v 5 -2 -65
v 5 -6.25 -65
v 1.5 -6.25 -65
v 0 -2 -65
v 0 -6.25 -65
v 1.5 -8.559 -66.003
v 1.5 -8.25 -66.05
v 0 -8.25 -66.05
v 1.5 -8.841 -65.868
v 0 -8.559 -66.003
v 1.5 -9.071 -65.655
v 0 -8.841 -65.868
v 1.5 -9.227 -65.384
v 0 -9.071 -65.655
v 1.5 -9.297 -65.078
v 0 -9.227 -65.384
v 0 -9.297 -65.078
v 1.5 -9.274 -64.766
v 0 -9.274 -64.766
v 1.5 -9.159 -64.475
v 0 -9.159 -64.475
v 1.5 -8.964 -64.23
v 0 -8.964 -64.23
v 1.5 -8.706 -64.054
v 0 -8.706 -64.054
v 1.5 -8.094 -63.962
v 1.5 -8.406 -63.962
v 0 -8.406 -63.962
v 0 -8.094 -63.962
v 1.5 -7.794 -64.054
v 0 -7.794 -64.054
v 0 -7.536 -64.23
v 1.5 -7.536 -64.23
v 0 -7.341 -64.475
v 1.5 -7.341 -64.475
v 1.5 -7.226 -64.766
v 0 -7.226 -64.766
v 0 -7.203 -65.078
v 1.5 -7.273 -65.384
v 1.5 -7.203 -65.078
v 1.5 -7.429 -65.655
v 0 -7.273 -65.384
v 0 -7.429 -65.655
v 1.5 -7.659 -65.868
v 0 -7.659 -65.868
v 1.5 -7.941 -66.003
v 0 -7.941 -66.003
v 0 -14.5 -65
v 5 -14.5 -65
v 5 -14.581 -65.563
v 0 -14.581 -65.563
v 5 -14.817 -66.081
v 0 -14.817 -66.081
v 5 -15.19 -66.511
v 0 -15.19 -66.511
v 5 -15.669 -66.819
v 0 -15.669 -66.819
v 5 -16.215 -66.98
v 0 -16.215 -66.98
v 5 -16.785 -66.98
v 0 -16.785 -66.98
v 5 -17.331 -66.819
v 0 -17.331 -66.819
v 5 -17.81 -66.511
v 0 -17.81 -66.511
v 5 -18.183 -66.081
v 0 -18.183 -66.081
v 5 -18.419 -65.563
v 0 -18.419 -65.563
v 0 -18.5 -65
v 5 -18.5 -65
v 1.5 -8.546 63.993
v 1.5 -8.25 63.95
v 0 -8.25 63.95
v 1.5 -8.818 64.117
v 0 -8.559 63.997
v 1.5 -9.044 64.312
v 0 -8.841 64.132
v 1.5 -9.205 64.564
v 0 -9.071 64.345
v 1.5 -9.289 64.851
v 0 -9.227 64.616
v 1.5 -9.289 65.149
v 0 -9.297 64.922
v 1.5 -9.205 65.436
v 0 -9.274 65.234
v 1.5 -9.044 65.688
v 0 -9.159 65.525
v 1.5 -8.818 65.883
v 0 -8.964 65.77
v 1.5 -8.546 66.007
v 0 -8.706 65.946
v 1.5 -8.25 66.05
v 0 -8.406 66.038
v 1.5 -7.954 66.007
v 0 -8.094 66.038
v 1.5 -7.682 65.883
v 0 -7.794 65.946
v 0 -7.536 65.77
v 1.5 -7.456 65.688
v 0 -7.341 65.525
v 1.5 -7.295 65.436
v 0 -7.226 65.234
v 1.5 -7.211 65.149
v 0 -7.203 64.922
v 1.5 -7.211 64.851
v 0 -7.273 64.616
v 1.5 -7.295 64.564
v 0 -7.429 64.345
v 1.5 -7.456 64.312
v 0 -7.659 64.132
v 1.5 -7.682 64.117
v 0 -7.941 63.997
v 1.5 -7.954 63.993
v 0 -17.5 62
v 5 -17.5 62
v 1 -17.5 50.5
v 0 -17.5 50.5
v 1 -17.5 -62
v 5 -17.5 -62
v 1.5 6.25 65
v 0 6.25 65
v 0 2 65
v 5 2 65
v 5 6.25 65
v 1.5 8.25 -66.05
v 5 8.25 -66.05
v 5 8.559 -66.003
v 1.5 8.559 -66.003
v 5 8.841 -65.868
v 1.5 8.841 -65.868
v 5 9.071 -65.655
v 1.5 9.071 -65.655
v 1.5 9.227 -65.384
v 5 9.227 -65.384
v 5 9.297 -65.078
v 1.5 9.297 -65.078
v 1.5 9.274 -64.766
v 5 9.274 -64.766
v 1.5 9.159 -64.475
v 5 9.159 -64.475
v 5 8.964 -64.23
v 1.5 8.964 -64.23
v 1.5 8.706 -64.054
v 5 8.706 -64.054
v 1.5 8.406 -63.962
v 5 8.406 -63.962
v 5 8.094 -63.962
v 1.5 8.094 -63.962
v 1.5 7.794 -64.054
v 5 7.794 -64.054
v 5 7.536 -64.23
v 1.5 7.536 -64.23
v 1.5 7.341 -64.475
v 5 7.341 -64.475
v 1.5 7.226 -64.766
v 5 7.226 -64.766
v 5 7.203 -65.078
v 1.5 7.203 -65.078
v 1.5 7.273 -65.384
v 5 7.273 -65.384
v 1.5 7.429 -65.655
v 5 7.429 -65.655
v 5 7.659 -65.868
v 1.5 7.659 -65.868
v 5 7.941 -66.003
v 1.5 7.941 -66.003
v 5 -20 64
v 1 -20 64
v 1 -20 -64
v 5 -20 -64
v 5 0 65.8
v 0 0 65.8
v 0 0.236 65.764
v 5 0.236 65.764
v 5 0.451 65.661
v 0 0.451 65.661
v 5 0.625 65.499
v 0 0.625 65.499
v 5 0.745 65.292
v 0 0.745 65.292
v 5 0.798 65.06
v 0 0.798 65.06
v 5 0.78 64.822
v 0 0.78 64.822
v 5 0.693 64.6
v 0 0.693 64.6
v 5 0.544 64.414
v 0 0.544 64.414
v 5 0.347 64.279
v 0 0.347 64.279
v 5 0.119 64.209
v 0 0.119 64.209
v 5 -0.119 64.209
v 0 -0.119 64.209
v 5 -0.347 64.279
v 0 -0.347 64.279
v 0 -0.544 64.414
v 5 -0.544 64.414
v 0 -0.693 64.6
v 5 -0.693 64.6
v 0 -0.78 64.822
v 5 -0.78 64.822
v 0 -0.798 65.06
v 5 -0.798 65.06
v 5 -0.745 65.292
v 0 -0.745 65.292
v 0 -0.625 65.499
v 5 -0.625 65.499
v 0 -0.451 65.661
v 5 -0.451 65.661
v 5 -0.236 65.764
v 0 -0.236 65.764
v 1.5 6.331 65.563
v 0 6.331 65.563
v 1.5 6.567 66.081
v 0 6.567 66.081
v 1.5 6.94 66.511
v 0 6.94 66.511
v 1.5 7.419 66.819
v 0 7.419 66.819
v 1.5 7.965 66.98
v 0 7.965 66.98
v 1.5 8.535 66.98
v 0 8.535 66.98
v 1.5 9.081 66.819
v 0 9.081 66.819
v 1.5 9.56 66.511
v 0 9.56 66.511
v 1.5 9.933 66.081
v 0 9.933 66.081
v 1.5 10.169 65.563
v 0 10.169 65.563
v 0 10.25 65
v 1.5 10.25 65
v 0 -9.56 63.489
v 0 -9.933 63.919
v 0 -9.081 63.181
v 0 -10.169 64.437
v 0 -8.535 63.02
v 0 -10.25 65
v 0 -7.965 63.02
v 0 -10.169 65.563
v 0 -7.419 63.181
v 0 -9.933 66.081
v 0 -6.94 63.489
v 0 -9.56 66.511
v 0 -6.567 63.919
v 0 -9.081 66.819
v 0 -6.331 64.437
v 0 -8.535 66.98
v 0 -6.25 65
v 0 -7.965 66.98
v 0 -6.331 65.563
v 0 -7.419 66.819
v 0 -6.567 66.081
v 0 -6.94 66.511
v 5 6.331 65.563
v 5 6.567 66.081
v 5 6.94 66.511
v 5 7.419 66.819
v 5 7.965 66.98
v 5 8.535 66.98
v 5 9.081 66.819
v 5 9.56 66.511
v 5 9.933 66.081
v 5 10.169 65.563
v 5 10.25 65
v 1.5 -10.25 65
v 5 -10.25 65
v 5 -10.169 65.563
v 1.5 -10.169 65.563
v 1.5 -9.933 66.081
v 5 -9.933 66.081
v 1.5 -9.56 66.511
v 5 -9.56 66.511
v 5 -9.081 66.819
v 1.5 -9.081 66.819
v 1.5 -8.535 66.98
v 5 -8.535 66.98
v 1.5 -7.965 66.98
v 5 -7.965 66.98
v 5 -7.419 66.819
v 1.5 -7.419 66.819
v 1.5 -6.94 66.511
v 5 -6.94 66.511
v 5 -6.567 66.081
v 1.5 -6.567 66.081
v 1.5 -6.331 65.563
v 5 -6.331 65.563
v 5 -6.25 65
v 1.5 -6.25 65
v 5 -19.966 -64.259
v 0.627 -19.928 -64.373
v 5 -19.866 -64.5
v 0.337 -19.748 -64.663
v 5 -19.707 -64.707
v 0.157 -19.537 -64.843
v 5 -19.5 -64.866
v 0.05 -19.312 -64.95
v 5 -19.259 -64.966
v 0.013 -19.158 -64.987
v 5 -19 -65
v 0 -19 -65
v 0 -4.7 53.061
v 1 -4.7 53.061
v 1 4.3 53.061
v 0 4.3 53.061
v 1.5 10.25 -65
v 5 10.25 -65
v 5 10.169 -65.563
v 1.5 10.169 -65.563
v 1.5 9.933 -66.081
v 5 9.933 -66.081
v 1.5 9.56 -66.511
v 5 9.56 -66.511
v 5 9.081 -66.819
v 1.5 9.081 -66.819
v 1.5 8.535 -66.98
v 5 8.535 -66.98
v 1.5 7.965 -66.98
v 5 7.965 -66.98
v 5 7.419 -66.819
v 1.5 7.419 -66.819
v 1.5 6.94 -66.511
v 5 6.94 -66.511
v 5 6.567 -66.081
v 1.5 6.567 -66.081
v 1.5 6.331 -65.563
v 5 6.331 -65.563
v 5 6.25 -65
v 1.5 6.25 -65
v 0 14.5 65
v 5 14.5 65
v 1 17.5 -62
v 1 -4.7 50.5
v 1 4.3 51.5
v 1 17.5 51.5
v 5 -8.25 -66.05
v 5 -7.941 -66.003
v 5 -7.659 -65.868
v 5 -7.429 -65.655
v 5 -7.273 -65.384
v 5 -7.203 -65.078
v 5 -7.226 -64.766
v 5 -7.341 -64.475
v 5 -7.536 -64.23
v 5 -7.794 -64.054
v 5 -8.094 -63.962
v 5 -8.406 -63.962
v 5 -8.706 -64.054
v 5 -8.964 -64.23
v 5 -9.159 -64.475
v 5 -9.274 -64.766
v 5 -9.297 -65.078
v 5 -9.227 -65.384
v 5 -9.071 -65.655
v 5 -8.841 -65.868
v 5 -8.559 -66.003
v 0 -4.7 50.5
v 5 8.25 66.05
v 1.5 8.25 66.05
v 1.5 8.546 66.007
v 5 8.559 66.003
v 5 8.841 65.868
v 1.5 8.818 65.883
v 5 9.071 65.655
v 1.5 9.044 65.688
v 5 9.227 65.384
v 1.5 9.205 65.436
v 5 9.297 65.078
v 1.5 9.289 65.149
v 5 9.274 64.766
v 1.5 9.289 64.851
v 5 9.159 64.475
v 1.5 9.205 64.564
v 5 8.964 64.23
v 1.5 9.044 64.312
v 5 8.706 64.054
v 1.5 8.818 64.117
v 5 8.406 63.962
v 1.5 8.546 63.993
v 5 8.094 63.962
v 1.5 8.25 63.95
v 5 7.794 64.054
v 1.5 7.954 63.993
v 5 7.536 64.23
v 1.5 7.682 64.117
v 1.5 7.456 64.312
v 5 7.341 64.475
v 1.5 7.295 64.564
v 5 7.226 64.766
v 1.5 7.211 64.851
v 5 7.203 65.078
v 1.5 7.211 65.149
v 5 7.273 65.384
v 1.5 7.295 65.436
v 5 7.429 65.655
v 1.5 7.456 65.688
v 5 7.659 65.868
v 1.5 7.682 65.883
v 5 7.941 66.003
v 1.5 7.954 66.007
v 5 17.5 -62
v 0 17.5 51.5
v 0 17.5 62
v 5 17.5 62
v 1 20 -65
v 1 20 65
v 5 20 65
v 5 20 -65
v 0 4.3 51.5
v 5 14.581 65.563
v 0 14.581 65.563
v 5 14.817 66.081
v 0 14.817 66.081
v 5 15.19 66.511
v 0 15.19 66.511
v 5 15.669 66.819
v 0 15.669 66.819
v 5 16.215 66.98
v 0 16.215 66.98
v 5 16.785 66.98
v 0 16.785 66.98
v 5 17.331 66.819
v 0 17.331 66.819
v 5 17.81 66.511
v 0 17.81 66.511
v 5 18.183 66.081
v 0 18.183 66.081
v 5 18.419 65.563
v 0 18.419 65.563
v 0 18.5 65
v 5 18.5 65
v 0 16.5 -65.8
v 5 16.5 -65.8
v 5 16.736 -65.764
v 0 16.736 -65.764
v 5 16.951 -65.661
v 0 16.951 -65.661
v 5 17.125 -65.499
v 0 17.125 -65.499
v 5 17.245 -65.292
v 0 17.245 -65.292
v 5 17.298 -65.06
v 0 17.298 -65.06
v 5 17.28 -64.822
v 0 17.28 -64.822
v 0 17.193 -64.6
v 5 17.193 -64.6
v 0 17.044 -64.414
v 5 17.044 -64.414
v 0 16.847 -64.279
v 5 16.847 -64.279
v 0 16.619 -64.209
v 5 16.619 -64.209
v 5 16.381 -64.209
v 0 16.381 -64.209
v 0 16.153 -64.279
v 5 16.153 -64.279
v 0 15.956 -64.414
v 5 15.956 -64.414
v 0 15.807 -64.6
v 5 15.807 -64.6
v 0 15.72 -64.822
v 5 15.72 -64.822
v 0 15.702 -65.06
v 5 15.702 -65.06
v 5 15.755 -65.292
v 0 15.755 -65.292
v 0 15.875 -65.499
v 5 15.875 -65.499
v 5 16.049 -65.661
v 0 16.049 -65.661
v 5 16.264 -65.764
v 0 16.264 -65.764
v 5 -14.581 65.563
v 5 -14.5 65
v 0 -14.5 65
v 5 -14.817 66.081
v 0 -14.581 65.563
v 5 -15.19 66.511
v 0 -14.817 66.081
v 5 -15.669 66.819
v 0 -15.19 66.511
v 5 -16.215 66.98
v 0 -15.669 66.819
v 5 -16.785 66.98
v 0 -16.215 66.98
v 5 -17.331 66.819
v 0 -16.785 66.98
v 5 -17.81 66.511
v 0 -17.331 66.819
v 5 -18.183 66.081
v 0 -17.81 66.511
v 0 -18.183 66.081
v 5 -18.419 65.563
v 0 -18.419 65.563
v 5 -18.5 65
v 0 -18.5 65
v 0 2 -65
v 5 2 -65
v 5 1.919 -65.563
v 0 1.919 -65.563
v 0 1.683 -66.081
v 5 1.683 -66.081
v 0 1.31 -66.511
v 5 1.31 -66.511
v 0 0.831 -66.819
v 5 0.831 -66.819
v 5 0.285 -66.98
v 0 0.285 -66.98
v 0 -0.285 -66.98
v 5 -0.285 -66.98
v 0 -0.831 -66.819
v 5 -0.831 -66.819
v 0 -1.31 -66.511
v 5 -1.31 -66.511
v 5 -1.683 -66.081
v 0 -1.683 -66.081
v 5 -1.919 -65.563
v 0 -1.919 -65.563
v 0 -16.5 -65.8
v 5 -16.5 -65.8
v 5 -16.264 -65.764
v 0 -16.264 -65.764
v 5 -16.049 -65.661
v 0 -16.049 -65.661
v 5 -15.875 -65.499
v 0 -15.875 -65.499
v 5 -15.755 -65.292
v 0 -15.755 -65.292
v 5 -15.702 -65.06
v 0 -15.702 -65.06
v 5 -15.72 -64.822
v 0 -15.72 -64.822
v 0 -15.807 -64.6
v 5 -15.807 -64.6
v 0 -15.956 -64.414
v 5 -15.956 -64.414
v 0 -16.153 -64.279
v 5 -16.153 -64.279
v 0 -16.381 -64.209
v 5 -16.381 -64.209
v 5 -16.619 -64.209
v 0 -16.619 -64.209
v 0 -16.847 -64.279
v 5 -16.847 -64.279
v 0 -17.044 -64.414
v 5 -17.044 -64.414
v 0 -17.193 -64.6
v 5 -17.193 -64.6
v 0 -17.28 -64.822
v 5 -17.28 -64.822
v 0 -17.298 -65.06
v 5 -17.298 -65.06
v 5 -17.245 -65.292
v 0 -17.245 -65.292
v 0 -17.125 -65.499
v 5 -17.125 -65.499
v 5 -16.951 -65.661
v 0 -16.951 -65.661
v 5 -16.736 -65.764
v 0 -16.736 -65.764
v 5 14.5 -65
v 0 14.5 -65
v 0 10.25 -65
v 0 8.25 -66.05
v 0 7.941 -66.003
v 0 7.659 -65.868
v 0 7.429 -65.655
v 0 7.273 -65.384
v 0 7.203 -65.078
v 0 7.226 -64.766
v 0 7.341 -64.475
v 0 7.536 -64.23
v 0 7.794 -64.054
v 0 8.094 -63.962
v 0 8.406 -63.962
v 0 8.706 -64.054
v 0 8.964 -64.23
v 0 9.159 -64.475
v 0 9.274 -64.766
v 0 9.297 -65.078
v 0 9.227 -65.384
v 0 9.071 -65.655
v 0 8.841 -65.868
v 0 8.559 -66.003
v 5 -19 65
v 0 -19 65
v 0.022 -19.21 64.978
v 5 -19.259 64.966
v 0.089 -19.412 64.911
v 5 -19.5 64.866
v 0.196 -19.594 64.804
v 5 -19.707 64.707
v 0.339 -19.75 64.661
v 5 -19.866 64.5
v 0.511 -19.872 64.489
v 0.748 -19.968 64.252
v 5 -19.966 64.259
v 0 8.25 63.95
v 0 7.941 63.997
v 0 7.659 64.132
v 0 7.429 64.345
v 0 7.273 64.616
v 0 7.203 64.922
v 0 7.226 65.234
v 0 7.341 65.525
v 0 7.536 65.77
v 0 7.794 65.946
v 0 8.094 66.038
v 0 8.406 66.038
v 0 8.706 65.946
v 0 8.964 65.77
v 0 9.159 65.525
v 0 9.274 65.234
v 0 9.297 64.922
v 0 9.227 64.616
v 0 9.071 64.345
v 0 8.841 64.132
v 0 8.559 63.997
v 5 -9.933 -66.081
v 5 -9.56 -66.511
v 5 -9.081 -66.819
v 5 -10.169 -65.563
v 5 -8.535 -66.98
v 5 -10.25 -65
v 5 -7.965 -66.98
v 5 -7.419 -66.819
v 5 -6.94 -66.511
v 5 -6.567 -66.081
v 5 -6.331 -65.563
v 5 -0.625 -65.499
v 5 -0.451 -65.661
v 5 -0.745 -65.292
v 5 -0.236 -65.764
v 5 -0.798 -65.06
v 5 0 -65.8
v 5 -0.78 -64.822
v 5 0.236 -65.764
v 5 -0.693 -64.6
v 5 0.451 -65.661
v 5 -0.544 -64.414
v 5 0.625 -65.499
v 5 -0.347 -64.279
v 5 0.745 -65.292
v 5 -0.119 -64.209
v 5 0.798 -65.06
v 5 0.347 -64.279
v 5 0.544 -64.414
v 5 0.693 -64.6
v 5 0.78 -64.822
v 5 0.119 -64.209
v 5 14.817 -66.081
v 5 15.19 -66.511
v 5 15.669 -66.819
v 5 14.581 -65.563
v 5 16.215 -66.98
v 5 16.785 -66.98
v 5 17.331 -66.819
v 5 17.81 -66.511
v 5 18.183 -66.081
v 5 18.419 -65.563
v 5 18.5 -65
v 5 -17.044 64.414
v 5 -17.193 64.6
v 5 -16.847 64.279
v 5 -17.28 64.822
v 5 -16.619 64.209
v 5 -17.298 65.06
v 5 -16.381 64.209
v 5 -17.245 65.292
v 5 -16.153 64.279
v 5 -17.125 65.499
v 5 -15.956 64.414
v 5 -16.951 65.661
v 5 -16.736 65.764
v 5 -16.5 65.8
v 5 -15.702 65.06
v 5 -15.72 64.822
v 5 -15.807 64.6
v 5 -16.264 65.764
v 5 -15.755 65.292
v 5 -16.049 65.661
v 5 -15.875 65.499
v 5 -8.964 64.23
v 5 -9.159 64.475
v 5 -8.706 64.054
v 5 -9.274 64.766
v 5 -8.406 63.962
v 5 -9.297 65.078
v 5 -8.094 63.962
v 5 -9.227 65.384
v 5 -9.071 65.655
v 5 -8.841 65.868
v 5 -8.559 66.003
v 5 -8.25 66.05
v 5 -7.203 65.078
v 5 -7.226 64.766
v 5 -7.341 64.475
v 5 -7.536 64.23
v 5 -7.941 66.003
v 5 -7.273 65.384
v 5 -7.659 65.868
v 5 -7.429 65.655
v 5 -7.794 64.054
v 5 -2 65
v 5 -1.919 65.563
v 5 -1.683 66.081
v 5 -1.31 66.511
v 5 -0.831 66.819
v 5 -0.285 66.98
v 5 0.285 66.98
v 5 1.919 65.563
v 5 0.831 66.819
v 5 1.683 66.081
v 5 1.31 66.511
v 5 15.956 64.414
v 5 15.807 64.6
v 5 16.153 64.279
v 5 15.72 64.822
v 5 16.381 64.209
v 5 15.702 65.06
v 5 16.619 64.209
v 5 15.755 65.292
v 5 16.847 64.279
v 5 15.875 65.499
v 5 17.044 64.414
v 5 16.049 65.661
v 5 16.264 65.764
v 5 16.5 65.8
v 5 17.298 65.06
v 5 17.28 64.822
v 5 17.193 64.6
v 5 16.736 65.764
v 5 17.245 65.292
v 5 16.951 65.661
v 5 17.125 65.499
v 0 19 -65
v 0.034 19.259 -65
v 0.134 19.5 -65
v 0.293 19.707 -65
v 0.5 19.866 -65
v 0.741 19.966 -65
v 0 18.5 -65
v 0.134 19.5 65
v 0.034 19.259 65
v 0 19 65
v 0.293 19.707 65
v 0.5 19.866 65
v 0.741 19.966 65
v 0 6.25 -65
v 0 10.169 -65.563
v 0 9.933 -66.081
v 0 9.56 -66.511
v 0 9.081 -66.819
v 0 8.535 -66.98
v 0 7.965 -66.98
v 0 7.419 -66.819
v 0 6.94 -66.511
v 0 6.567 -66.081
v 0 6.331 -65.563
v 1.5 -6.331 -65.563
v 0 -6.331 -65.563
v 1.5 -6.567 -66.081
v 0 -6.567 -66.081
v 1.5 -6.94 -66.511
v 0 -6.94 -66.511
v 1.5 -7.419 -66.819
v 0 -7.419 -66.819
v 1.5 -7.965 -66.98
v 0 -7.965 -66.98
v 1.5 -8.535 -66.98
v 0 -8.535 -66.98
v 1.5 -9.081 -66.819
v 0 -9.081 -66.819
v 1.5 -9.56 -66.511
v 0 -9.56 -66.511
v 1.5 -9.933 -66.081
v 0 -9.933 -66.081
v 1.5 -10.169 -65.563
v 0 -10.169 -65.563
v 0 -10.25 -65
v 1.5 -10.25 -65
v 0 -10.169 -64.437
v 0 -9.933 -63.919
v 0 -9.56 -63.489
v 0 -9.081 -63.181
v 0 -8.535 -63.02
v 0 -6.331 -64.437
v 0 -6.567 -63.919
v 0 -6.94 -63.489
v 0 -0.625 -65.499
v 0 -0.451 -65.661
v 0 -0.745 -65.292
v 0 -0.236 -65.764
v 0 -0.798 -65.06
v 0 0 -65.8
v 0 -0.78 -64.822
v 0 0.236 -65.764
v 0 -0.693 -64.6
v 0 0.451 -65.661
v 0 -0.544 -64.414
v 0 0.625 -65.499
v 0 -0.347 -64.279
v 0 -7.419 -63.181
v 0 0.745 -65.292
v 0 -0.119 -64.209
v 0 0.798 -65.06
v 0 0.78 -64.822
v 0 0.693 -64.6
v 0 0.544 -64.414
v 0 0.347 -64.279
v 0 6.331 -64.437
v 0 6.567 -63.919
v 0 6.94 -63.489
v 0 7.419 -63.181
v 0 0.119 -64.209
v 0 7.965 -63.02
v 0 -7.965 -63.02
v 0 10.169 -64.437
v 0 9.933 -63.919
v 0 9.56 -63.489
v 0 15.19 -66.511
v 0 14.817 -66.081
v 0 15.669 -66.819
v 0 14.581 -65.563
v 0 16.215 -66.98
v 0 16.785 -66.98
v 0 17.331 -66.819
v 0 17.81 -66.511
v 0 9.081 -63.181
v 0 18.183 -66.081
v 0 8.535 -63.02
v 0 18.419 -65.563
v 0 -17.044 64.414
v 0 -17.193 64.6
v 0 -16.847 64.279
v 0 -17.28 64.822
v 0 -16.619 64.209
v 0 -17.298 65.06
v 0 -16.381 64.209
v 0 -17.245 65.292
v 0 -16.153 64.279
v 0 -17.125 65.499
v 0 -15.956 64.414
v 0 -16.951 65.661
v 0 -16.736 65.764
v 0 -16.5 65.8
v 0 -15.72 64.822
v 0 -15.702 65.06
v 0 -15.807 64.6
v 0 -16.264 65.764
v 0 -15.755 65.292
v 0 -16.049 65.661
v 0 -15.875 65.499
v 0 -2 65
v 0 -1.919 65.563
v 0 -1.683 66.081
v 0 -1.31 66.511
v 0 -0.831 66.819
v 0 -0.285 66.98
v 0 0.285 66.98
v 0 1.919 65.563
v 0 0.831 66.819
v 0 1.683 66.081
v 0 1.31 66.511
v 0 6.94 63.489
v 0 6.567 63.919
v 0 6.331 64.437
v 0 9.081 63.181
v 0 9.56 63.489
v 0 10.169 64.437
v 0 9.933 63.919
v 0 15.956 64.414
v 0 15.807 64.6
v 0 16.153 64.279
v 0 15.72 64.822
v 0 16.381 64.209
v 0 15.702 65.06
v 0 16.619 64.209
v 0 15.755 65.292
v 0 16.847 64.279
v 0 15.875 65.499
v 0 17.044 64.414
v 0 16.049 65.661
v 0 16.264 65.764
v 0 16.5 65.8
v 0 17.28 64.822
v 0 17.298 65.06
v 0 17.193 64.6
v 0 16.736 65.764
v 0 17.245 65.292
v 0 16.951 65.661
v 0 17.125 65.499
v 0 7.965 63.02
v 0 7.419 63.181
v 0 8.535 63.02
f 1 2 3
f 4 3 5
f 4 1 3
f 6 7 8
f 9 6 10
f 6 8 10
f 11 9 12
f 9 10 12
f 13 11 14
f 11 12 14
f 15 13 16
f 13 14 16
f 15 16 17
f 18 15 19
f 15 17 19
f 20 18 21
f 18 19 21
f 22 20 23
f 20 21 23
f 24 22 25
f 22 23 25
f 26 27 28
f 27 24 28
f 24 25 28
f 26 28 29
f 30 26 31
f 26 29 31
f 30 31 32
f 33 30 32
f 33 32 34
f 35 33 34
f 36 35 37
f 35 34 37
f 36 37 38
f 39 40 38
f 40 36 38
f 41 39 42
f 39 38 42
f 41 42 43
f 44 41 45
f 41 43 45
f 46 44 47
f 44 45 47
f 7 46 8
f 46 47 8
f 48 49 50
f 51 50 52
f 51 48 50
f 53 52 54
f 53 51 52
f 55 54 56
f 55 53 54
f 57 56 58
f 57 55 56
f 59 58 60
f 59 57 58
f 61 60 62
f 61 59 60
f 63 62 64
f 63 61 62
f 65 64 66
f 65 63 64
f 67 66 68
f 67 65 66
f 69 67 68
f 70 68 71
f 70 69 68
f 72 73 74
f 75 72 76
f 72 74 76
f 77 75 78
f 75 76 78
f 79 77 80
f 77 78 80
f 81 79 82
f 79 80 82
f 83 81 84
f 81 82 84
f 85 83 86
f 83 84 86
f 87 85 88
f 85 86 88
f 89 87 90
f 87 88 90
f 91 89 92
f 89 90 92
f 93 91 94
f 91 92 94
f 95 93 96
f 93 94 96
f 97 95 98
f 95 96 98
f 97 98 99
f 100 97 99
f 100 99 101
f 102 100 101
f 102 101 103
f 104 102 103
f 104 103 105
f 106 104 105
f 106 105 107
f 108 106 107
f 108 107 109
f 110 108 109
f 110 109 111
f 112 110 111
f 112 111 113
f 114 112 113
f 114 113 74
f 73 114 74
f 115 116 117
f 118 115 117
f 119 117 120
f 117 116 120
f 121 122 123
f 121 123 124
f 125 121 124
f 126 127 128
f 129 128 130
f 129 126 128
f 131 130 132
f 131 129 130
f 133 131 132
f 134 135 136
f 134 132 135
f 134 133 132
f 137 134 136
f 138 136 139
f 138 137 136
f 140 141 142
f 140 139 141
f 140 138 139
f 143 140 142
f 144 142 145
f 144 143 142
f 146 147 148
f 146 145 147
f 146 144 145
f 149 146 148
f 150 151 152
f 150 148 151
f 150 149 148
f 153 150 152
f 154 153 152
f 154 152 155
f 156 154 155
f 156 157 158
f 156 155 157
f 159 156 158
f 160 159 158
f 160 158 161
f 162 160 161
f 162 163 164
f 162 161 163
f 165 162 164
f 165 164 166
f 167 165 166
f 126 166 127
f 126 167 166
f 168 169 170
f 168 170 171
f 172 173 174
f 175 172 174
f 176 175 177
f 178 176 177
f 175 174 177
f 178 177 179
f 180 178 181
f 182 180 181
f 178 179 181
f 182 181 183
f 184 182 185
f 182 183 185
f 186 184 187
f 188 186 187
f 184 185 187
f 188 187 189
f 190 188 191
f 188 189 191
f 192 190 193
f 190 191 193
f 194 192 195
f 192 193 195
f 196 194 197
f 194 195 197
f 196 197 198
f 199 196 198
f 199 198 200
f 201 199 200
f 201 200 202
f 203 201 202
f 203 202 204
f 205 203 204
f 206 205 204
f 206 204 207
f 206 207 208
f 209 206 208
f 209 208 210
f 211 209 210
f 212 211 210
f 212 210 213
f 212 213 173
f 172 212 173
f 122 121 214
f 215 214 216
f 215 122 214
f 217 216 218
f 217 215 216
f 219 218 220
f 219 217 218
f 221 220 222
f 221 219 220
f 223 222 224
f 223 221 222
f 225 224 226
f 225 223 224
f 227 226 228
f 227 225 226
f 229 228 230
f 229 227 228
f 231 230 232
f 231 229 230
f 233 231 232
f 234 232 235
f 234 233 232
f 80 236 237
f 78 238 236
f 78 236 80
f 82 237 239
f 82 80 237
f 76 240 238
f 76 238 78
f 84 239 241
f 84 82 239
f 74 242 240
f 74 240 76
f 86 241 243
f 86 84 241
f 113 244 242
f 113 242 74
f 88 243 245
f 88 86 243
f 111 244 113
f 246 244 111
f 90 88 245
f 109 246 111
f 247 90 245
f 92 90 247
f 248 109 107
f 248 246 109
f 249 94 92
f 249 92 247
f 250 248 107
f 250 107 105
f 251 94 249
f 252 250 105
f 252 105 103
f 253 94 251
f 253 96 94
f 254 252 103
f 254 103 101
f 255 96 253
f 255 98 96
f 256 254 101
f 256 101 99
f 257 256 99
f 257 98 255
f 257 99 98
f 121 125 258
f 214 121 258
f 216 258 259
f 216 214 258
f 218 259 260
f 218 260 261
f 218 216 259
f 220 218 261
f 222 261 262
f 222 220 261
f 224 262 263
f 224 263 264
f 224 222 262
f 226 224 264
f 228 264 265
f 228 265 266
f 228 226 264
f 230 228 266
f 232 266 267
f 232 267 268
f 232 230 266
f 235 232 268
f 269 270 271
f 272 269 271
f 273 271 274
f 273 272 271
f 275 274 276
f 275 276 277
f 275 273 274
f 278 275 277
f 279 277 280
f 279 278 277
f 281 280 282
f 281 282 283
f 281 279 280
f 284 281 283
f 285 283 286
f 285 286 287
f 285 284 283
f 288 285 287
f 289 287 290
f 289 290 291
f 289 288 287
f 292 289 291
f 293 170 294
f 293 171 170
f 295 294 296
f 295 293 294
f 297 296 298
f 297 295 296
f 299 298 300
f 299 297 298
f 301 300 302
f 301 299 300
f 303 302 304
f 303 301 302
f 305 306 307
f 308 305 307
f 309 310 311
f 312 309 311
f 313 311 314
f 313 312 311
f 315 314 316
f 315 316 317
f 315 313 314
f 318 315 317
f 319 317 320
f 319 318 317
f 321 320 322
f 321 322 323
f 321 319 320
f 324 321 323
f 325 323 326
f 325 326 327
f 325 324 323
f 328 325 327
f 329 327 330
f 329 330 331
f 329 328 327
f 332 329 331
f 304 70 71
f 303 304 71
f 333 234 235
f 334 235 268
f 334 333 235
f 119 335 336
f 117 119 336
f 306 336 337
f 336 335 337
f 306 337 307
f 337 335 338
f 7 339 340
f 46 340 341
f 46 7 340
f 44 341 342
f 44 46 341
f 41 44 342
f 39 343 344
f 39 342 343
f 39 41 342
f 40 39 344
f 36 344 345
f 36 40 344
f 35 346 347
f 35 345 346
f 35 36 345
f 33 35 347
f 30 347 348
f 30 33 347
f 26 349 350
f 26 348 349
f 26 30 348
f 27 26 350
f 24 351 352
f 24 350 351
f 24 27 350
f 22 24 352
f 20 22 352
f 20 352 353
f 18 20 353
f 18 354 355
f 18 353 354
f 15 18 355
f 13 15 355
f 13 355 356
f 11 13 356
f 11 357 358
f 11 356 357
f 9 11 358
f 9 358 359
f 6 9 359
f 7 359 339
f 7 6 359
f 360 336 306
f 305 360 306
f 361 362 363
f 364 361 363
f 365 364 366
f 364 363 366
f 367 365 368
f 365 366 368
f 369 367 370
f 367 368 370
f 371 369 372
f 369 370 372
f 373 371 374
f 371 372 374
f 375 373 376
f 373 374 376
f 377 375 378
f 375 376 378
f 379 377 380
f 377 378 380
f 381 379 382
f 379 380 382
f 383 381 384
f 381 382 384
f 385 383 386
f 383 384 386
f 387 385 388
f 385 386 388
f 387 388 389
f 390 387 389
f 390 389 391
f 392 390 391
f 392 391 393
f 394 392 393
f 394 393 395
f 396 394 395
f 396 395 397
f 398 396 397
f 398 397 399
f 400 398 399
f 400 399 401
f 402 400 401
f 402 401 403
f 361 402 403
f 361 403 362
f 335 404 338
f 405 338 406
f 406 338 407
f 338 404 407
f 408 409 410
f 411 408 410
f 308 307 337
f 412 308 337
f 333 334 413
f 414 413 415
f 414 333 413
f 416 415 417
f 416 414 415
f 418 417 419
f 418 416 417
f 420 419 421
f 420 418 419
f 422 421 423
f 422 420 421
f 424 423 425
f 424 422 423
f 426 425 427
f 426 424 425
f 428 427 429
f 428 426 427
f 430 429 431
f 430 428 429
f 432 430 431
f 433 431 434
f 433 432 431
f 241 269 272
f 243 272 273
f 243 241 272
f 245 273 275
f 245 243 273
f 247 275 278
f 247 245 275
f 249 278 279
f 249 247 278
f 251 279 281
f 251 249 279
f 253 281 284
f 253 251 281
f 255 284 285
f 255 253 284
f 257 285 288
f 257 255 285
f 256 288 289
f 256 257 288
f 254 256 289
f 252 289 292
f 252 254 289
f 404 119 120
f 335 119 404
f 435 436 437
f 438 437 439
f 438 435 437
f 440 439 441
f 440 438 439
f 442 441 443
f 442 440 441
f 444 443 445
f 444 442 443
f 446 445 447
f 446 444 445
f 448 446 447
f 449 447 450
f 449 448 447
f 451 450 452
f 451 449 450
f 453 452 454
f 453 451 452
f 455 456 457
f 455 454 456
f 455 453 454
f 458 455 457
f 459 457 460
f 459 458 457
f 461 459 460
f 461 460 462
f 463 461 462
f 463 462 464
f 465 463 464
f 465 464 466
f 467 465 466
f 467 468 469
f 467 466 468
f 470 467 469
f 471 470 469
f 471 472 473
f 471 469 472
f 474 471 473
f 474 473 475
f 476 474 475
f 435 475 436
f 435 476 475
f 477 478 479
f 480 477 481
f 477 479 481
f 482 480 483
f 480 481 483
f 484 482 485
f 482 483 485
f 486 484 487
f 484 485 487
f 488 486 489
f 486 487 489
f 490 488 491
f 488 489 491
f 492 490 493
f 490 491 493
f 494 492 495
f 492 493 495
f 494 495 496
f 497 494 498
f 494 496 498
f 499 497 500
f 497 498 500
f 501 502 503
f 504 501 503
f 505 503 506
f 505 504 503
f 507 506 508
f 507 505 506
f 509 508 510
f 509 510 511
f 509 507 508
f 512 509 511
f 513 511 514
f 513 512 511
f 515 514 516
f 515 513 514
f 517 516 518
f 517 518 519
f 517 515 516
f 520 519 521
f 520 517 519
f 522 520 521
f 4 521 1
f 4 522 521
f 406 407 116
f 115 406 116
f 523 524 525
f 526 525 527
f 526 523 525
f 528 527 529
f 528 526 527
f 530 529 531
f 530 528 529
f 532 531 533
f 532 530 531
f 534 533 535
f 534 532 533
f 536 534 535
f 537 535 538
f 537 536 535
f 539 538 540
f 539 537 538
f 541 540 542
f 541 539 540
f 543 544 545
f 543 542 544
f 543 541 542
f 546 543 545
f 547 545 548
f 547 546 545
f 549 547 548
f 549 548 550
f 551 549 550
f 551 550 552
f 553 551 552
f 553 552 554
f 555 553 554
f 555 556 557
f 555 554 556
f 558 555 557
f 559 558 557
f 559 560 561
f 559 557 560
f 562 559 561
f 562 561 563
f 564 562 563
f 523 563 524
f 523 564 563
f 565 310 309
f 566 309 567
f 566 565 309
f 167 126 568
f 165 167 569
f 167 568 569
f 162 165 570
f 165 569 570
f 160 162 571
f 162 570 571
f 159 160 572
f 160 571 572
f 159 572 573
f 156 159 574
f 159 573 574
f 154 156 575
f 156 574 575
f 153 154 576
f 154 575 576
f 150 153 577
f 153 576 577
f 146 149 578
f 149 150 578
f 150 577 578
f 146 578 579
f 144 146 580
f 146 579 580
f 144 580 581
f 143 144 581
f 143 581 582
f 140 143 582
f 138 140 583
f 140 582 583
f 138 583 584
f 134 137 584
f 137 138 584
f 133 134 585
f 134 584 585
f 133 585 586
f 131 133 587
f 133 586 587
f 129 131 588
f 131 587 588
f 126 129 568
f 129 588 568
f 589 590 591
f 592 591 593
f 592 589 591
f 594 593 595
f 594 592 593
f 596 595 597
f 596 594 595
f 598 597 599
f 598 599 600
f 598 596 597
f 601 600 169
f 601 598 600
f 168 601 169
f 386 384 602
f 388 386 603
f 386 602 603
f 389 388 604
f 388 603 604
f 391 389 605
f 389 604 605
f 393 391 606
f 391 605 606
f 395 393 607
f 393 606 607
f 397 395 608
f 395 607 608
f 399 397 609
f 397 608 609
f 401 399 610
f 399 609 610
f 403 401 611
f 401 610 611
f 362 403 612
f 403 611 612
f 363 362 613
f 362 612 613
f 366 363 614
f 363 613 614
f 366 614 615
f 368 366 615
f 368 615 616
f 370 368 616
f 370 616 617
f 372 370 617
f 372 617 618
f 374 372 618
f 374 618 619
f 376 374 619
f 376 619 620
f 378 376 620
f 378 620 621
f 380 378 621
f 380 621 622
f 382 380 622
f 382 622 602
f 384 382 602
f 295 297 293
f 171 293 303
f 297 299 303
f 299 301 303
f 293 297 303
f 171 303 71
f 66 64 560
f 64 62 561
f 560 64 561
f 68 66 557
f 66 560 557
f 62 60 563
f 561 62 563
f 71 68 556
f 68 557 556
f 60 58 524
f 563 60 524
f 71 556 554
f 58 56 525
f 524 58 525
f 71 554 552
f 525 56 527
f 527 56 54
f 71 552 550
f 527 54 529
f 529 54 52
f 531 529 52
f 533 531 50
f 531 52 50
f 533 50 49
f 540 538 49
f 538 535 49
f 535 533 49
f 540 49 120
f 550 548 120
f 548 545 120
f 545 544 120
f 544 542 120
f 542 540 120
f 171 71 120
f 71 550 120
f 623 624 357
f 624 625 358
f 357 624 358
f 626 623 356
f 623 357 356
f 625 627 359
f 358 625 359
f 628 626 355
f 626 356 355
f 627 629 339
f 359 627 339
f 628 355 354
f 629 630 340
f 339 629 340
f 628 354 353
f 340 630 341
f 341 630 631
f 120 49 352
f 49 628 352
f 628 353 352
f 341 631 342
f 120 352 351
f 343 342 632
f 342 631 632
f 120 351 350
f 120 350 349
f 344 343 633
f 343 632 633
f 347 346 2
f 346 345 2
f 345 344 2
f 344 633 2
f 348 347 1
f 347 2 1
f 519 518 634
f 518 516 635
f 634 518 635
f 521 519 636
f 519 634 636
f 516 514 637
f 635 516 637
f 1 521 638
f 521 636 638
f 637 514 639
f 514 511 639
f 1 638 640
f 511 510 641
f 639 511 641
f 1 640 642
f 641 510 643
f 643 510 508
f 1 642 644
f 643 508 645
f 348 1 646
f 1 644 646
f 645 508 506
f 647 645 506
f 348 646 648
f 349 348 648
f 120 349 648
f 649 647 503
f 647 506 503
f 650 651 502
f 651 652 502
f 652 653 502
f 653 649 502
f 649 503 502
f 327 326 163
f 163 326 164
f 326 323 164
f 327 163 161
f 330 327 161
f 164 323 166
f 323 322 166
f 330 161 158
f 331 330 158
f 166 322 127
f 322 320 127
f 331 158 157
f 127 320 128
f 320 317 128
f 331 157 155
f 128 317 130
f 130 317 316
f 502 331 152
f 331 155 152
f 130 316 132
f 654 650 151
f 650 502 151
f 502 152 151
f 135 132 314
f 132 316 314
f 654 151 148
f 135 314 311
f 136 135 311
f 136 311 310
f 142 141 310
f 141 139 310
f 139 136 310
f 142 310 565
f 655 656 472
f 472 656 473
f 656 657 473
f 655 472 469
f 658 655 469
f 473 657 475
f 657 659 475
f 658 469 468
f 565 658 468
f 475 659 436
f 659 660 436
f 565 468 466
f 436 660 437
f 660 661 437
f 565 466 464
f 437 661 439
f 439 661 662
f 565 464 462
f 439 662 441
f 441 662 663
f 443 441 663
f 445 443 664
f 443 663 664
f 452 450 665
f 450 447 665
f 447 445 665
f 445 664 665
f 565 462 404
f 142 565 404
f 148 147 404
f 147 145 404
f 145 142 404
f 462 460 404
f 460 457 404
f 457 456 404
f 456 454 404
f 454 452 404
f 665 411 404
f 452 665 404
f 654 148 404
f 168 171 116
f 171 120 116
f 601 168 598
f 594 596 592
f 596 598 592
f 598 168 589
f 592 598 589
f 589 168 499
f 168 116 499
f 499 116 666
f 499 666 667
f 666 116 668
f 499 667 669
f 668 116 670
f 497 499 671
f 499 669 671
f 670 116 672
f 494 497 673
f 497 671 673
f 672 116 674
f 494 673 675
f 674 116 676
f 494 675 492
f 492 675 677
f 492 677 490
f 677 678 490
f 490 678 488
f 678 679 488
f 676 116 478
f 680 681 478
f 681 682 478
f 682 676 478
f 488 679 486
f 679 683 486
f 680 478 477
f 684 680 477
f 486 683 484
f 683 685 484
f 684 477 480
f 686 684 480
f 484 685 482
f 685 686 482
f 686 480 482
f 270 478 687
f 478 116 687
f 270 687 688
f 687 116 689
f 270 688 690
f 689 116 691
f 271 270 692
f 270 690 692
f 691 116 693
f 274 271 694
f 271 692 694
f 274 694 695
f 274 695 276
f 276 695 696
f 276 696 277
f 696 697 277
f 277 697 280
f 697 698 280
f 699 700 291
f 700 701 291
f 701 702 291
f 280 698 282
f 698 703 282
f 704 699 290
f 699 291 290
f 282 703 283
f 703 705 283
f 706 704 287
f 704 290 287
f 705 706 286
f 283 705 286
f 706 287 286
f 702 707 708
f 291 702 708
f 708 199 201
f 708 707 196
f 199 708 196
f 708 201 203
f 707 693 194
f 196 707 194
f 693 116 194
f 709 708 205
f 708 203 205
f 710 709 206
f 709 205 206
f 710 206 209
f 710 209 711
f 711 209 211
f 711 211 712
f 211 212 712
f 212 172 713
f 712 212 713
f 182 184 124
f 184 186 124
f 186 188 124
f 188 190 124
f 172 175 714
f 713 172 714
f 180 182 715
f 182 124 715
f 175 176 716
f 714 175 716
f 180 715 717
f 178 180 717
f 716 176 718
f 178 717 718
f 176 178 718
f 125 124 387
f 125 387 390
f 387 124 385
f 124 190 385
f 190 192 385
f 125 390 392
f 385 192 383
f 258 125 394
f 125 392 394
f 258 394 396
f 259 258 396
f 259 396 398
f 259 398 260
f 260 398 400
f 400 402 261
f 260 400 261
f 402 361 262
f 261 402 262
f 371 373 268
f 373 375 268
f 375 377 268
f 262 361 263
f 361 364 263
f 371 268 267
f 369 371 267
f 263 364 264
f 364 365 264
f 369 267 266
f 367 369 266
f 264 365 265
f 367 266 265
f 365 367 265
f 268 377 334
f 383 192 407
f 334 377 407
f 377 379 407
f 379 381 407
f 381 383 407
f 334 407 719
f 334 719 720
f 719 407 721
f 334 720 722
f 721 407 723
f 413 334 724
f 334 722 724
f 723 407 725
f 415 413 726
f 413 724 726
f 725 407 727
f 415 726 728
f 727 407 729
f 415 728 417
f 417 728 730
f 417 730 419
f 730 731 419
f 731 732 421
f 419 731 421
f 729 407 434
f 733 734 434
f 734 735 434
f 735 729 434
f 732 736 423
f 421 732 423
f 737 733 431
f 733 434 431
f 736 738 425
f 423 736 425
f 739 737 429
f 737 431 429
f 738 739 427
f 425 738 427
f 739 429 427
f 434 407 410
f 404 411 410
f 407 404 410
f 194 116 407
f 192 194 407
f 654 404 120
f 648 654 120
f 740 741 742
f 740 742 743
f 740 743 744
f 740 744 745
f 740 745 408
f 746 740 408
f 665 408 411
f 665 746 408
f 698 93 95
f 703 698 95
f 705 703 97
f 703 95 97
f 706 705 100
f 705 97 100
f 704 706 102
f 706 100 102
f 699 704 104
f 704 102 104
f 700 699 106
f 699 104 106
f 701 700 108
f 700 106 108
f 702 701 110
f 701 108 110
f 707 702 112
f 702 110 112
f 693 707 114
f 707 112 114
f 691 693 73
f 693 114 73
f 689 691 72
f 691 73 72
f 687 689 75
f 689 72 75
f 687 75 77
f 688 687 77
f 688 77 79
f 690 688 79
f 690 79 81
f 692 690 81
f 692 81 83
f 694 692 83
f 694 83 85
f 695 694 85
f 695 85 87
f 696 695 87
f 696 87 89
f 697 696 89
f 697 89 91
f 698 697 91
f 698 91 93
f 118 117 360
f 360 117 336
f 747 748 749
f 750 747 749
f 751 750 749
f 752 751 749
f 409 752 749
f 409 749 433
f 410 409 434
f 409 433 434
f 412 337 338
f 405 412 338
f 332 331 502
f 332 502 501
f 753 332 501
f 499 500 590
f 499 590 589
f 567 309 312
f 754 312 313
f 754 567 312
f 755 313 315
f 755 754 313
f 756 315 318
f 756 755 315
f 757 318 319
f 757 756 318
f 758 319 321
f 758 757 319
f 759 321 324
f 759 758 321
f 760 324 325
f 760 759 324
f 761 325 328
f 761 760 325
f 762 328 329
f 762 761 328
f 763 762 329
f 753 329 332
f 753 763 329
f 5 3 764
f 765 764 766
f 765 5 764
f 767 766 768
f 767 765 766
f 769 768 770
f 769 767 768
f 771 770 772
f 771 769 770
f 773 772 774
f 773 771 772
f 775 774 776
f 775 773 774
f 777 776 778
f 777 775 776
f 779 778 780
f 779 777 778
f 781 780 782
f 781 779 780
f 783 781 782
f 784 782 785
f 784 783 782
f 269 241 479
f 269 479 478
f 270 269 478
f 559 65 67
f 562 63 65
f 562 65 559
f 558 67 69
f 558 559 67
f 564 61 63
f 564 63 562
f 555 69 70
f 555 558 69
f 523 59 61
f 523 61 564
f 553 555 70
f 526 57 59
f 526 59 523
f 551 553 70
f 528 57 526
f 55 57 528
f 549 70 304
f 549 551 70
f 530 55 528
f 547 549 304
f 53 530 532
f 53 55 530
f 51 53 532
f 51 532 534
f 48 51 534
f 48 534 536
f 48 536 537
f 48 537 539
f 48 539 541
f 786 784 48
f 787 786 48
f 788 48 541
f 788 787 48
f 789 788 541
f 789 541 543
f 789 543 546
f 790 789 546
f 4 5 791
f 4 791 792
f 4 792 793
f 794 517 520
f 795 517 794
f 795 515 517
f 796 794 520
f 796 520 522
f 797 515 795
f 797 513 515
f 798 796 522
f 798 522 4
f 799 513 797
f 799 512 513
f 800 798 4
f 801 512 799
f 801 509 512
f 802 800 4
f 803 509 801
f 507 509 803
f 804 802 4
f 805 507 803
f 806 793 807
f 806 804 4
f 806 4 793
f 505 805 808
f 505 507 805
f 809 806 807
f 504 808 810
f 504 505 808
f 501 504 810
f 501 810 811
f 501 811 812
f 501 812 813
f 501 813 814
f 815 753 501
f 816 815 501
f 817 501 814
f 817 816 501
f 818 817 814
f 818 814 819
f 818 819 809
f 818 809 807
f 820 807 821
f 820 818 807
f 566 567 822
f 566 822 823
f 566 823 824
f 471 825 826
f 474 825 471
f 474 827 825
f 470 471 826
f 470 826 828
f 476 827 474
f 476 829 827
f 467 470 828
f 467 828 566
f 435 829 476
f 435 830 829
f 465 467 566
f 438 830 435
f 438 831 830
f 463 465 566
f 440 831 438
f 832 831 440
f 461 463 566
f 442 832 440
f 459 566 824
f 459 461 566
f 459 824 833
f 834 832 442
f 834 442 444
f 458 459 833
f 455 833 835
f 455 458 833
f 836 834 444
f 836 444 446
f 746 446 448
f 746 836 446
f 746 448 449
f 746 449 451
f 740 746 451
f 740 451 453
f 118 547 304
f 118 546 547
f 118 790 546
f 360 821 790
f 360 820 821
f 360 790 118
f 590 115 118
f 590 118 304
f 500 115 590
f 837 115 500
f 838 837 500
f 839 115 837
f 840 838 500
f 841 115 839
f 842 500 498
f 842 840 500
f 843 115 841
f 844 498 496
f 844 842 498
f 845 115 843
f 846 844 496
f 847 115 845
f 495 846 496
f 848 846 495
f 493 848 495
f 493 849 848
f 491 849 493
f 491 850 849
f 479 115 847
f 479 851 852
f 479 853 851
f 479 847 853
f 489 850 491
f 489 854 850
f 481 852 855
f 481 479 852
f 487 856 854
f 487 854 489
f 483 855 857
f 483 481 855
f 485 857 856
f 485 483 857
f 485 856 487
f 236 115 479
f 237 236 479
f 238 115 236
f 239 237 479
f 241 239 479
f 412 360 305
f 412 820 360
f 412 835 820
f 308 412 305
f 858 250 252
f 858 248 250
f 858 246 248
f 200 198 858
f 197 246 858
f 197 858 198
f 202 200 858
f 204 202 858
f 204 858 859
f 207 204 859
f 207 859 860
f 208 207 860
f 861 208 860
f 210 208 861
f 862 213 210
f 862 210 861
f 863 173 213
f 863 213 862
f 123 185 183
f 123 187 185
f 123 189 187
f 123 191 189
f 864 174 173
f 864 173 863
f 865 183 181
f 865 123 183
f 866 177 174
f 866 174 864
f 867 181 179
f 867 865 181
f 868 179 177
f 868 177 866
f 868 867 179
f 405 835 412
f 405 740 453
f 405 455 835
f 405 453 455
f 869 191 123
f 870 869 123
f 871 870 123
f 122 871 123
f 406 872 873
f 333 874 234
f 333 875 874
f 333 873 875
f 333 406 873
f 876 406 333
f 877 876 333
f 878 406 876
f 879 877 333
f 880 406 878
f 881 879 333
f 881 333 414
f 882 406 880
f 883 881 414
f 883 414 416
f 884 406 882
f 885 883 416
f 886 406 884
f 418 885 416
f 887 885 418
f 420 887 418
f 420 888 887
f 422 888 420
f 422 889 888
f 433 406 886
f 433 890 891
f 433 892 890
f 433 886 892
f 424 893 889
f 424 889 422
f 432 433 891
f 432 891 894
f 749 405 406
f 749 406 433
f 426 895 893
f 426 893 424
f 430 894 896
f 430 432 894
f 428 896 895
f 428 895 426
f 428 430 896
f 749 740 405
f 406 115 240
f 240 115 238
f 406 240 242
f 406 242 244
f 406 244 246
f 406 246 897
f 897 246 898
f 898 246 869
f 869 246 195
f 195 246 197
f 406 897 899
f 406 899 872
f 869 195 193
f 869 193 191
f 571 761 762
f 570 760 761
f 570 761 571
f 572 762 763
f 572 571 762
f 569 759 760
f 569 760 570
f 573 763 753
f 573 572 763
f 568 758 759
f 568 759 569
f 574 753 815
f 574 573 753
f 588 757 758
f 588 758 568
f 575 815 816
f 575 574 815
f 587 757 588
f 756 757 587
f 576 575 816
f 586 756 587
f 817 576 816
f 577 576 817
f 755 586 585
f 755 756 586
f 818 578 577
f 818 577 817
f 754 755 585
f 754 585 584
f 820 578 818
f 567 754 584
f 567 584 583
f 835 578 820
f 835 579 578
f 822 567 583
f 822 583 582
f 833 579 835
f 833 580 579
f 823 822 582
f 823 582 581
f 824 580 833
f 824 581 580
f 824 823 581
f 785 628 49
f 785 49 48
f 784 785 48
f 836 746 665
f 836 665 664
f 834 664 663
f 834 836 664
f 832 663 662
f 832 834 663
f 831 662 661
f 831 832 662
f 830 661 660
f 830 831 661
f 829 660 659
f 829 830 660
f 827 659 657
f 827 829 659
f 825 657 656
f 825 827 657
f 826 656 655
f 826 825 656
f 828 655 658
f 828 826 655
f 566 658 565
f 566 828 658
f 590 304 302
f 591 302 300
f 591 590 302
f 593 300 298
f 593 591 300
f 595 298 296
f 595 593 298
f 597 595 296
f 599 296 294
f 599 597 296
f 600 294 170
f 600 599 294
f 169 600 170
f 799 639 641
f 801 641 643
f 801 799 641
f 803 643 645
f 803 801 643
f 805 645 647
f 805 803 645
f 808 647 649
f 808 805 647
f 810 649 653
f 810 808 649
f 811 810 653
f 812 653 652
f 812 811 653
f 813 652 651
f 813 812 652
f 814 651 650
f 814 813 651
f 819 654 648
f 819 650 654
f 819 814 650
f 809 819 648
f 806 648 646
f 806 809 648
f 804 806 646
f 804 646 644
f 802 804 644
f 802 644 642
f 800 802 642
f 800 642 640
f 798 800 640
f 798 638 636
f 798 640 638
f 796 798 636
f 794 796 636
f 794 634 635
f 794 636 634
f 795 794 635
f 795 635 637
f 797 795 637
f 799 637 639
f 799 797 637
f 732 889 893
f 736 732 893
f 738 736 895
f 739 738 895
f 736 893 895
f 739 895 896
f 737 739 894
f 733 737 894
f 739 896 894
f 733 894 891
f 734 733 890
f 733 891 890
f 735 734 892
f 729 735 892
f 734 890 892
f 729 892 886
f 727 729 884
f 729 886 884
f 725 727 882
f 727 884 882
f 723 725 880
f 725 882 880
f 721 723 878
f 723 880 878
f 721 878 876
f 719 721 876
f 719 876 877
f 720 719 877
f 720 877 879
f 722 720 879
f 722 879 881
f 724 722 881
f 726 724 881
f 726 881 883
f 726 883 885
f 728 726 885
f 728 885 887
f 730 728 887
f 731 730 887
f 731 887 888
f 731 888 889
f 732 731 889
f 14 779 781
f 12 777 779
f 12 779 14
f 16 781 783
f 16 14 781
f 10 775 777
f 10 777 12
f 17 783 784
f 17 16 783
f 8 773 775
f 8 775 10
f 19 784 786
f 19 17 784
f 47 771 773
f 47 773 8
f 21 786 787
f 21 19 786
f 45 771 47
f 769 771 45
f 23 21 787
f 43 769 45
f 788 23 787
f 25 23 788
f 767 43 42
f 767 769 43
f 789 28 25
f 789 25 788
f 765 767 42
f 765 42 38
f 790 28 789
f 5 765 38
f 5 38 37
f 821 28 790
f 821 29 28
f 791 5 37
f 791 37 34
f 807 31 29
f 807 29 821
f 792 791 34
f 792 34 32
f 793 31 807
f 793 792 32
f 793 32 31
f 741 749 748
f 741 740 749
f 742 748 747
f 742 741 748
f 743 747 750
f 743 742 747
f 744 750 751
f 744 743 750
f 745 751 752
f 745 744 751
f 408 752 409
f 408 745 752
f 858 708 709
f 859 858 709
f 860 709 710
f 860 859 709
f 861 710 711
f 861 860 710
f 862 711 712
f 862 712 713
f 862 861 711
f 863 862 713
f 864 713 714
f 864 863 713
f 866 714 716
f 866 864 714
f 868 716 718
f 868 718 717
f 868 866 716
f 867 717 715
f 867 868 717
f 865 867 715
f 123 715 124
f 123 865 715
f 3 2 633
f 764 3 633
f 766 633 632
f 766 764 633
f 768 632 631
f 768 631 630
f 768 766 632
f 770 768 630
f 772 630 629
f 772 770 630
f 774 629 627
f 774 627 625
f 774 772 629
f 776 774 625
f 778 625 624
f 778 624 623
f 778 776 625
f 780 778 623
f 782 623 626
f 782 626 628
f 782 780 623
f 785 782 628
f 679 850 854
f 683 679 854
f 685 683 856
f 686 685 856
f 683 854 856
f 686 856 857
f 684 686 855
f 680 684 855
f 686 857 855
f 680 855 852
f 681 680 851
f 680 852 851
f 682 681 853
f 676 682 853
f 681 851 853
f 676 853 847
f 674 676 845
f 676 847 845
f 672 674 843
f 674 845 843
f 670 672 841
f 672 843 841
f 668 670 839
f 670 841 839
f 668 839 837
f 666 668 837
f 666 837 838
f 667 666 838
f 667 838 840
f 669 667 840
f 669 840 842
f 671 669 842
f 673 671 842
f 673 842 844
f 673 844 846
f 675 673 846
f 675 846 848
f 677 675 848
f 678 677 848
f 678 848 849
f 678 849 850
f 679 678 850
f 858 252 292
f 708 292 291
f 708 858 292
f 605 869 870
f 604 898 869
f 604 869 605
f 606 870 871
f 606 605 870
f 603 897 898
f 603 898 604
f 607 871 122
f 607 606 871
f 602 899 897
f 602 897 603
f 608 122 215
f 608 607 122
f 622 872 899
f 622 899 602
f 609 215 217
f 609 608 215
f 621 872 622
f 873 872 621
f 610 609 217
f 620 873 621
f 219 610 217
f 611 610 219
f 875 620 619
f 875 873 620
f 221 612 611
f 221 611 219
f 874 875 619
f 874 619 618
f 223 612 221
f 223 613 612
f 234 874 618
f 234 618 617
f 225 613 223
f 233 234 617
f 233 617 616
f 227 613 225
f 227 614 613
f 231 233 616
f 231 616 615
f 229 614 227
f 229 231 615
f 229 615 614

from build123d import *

# Parameters (mm, degrees)
SKETCH_1_W               = 126
SKETCH_1_H               = 37
SKETCH_1_W_2             = 124
SKETCH_1_H_2             = 35
EXTRUDE_1_DEPTH          = 6
SKETCH_2_W               = 126
SKETCH_2_H               = 37
EXTRUDE_2_DEPTH          = 1
SKETCH_3_W               = 6
SKETCH_3_H               = 37
EXTRUDE_3_DEPTH          = 2
SKETCH_4_W               = 6
SKETCH_4_H               = 37
EXTRUDE_4_DEPTH          = 2
SKETCH_10_R              = 2
EXTRUDE_6_DEPTH          = 6
PATTERN_LINEAR_1_COUNT   = 5
PATTERN_LINEAR_1_PITCH   = 8.25
MIRROR_2_COPY_1_SKETCH_R = 2
MIRROR_2_COPY_1_DEPTH    = 6
MIRROR_2_COPY_2_SKETCH_R = 2
MIRROR_2_COPY_2_DEPTH    = 6
MIRROR_2_COPY_3_SKETCH_R = 2
MIRROR_2_COPY_3_DEPTH    = 6
MIRROR_2_COPY_4_SKETCH_R = 2
MIRROR_2_COPY_4_DEPTH    = 6
SKETCH_13_R              = 0.8
CUT_EXTRUDE_4_DEPTH      = 70.765679241
SKETCH_14_R              = 2
CUT_EXTRUDE_5_DEPTH      = 1.5
SKETCH_15_R              = 1.05
CUT_EXTRUDE_6_DEPTH      = 70.652709926
CUT_EXTRUDE_7_DEPTH      = 10
SKETCH_18_W              = 185.055300519
SKETCH_18_H              = 78.031908054
CUT_EXTRUDE_8_DEPTH      = 1
SKETCH_19_W              = 5
SKETCH_19_H              = 130
EXTRUDE_7_DEPTH          = 1.5
SKETCH_20_W              = 5
SKETCH_20_H              = 130
EXTRUDE_8_DEPTH          = 1.5
SKETCH_21_W              = 9.5
SKETCH_21_H              = 12.2
CUT_EXTRUDE_9_DEPTH      = 10
FILLET_1_R               = 1
CUT_EXTRUDE_10_DEPTH     = 10
EXTRUDE_START            = 1.5
SKETCH_23_R              = 1.05
EXTRUDE_9_DEPTH          = 1.5


with BuildPart() as part:
    # 草图1 → 凸台-拉伸1 (new body)
    with BuildSketch(Plane(origin=(0, 0, 0), x_dir=(0, 0, -1), z_dir=(1, 0, 0))):
        Rectangle(SKETCH_1_W, SKETCH_1_H)
        Rectangle(SKETCH_1_W_2, SKETCH_1_H_2, mode=Mode.SUBTRACT)
    extrude(amount=EXTRUDE_1_DEPTH)

    # 草图2 → 凸台-拉伸2 (add)
    with BuildSketch(Plane.ZY):
        Rectangle(SKETCH_2_W, SKETCH_2_H)
    extrude(amount=-EXTRUDE_2_DEPTH)

    # 草图3 → 凸台-拉伸3 (add)
    with BuildSketch(Plane(origin=(0, 0, -63), x_dir=(-1, 0, 0), z_dir=(0, 0, -1))):
        with Locations((-3, 0)):
            Rectangle(SKETCH_3_W, SKETCH_3_H)
    extrude(amount=EXTRUDE_3_DEPTH)

    # 草图4 → 凸台-拉伸4 (add)
    with BuildSketch(Plane.XY.offset(63)):
        with Locations((3, 0)):
            Rectangle(SKETCH_4_W, SKETCH_4_H)
    extrude(amount=EXTRUDE_4_DEPTH)

    # 草图10 → 凸台-拉伸6 (add)
    with BuildSketch(Plane.ZY):
        with Locations((-65, -16.5)):
            Circle(SKETCH_10_R)
    extrude_6 = extrude(amount=-EXTRUDE_6_DEPTH)

    # 阵列(线性)1: 凸台-拉伸6 ×5
    with Locations(*[(0, i * PATTERN_LINEAR_1_PITCH, 0) for i in range(1, PATTERN_LINEAR_1_COUNT)]):
        add(extrude_6)

    # 镜向2: 凸台-拉伸6 across plane
    add(extrude_6.mirror(Plane.XY))

    # 镜向2 copy 1 sketch → 镜向2 copy 1 (add)
    with BuildSketch(Plane(origin=(0, 8.25, 0), x_dir=(0, 0, -1), z_dir=(-1, 0, 0))):
        with Locations((-65, 16.5)):
            Circle(MIRROR_2_COPY_1_SKETCH_R)
    extrude(amount=-MIRROR_2_COPY_1_DEPTH)

    # 镜向2 copy 2 sketch → 镜向2 copy 2 (add)
    with BuildSketch(Plane(origin=(0, 16.5, 0), x_dir=(0, 0, -1), z_dir=(-1, 0, 0))):
        with Locations((-65, 16.5)):
            Circle(MIRROR_2_COPY_2_SKETCH_R)
    extrude(amount=-MIRROR_2_COPY_2_DEPTH)

    # 镜向2 copy 3 sketch → 镜向2 copy 3 (add)
    with BuildSketch(Plane(origin=(0, 24.75, 0), x_dir=(0, 0, -1), z_dir=(-1, 0, 0))):
        with Locations((-65, 16.5)):
            Circle(MIRROR_2_COPY_3_SKETCH_R)
    extrude(amount=-MIRROR_2_COPY_3_DEPTH)

    # 镜向2 copy 4 sketch → 镜向2 copy 4 (add)
    with BuildSketch(Plane(origin=(0, 33, 0), x_dir=(0, 0, -1), z_dir=(-1, 0, 0))):
        with Locations((-65, 16.5)):
            Circle(MIRROR_2_COPY_4_SKETCH_R)
    extrude(amount=-MIRROR_2_COPY_4_DEPTH)

    # 草图13 → 切除-拉伸4 (cut, through all)
    with BuildSketch(Plane.ZY):
        with Locations((65, -16.5)):
            Circle(SKETCH_13_R)
        with Locations((65, 0)):
            Circle(SKETCH_13_R)
        with Locations((65, 16.5)):
            Circle(SKETCH_13_R)
    cut_extrude_4 = extrude(amount=-CUT_EXTRUDE_4_DEPTH, mode=Mode.SUBTRACT)

    # 草图14 → 切除-拉伸5 (cut)
    with BuildSketch(Plane.ZY):
        with Locations((65, -8.25)):
            Circle(SKETCH_14_R)
        with Locations((65, 8.25)):
            Circle(SKETCH_14_R)
    cut_extrude_5 = extrude(amount=-CUT_EXTRUDE_5_DEPTH, mode=Mode.SUBTRACT)

    # 草图15 → 切除-拉伸6 (cut, through all)
    with BuildSketch(Plane.ZY.offset(-1.5)):
        with Locations((65, -8.25)):
            Circle(SKETCH_15_R)
        with Locations((65, 8.25)):
            Circle(SKETCH_15_R)
    cut_extrude_6 = extrude(amount=-CUT_EXTRUDE_6_DEPTH, mode=Mode.SUBTRACT)

    # 镜向3: 切除-拉伸4, 切除-拉伸5, 切除-拉伸6 across plane
    add(cut_extrude_4.mirror(Plane.XY), mode=Mode.SUBTRACT)
    add(cut_extrude_5.mirror(Plane.XY), mode=Mode.SUBTRACT)
    add(cut_extrude_6.mirror(Plane.XY), mode=Mode.SUBTRACT)

    # 草图16 → 切除-拉伸7 (cut)
    with BuildSketch(Plane(origin=(1, 0, 0), x_dir=(0, 0, -1), z_dir=(1, 0, 0))):
        Polygon((-53.561328166, 17), (-61.5, 17), (-61.5, -17), (-53.561328166, -17), (-53.561328166, -9), (-53.561328166, -8), (-53.561328166, -5.2), align=None)
        Polygon((-51, -5.2), (-53.561328166, -5.2), (-53.561328166, -8), (-53.561328166, -9), (-53.561328166, -17), (-51, -17), align=None)
    extrude(amount=-CUT_EXTRUDE_7_DEPTH, mode=Mode.SUBTRACT)

    # 草图18 → 切除-拉伸8 (cut)
    with BuildSketch(Plane(origin=(6, 0, 0), x_dir=(0, 0, -1), z_dir=(1, 0, 0))):
        with Locations((-2.452376317, 2.737795631)):
            Rectangle(SKETCH_18_W, SKETCH_18_H)
    extrude(amount=-CUT_EXTRUDE_8_DEPTH, mode=Mode.SUBTRACT)

    # 草图19 → 凸台-拉伸7 (add)
    with BuildSketch(Plane(origin=(0, 18.5, 0), x_dir=(1, 0, 0), z_dir=(0, 1, 0))):
        with Locations((2.5, 0)):
            Rectangle(SKETCH_19_W, SKETCH_19_H)
    extrude(amount=EXTRUDE_7_DEPTH)

    # 草图20 → 凸台-拉伸8 (add)
    with BuildSketch(Plane.XZ.offset(18.5)):
        with Locations((2.5, 0)):
            Rectangle(SKETCH_20_W, SKETCH_20_H)
    extrude(amount=EXTRUDE_8_DEPTH)

    # 草图21 → 切除-拉伸9 (cut)
    with BuildSketch(Plane.ZY):
        with Locations((56.75, 10.9)):
            Rectangle(SKETCH_21_W, SKETCH_21_H)
    extrude(amount=-CUT_EXTRUDE_9_DEPTH, mode=Mode.SUBTRACT)

    # 圆角1
    fillet_1_edges = [part.edges().sort_by_distance(p)[0] for p in [
        (0, 20, 0),
        (2.5, -20, -65),
        (2.5, -20, 65),
        (0, -20, 0),
    ]]
    fillet(fillet_1_edges, radius=FILLET_1_R)

    # 草图22 → 切除-拉伸10 (cut)
    with BuildSketch(Plane(origin=(1, 0, 0), x_dir=(0, 0, -1), z_dir=(1, 0, 0))):
        Polygon((-62, 17.5), (-62, -17.5), (-50.5, -17.5), (-50.5, -4.7), (-53.061328166, -4.7), (-53.061328166, 4.3), (-51.5, 4.3), (-51.5, 17.5), align=None)
        Polygon((-61.5, -17), (-51, -17), (-51, -5.2), (-53.561328166, -5.2), (-53.561328166, 4.8), (-52, 4.8), (-52, 17), (-61.5, 17), align=None, mode=Mode.SUBTRACT)
    extrude(amount=-CUT_EXTRUDE_10_DEPTH, mode=Mode.SUBTRACT)

    # 草图23 → 凸台-拉伸9 (add)
    # profile 1 of 4: a face of its own
    with BuildSketch(Plane.ZY.offset(-1.5).offset(EXTRUDE_START)):
        with BuildLine():
            ThreePointArc((65, 10.25), (63, 8.25), (65, 6.25))
            ThreePointArc((65, 6.25), (67, 8.25), (65, 10.25))
        make_face()
        with Locations(Location((65, 8.25, 0), (0, 0, 180))):
            Circle(SKETCH_23_R, mode=Mode.SUBTRACT)
    # profile 2 of 4: a face of its own
    with BuildSketch(Plane.ZY.offset(-1.5).offset(EXTRUDE_START)):
        with BuildLine():
            ThreePointArc((65, -6.25), (63, -8.25), (65, -10.25))
            ThreePointArc((65, -10.25), (67, -8.25), (65, -6.25))
        make_face()
        with Locations(Location((65, -8.25, 0), (0, 0, 180))):
            Circle(SKETCH_23_R, mode=Mode.SUBTRACT)
    # profile 3 of 4: a face of its own
    with BuildSketch(Plane.ZY.offset(-1.5).offset(EXTRUDE_START)):
        with BuildLine():
            ThreePointArc((-65, -10.25), (-63, -8.25), (-65, -6.25))
            ThreePointArc((-65, -6.25), (-67, -8.25), (-65, -10.25))
        make_face()
        with Locations(Location((-65, -8.25, 0), (0, 0, 180))):
            Circle(SKETCH_23_R, mode=Mode.SUBTRACT)
    # profile 4 of 4: a face of its own
    with BuildSketch(Plane.ZY.offset(-1.5).offset(EXTRUDE_START)):
        with BuildLine():
            ThreePointArc((-65, 6.25), (-63, 8.25), (-65, 10.25))
            ThreePointArc((-65, 10.25), (-67, 8.25), (-65, 6.25))
        make_face()
        with Locations(Location((-65, 8.25, 0), (0, 0, 180))):
            Circle(SKETCH_23_R, mode=Mode.SUBTRACT)
    extrude(amount=-EXTRUDE_9_DEPTH)


solid = part.part
